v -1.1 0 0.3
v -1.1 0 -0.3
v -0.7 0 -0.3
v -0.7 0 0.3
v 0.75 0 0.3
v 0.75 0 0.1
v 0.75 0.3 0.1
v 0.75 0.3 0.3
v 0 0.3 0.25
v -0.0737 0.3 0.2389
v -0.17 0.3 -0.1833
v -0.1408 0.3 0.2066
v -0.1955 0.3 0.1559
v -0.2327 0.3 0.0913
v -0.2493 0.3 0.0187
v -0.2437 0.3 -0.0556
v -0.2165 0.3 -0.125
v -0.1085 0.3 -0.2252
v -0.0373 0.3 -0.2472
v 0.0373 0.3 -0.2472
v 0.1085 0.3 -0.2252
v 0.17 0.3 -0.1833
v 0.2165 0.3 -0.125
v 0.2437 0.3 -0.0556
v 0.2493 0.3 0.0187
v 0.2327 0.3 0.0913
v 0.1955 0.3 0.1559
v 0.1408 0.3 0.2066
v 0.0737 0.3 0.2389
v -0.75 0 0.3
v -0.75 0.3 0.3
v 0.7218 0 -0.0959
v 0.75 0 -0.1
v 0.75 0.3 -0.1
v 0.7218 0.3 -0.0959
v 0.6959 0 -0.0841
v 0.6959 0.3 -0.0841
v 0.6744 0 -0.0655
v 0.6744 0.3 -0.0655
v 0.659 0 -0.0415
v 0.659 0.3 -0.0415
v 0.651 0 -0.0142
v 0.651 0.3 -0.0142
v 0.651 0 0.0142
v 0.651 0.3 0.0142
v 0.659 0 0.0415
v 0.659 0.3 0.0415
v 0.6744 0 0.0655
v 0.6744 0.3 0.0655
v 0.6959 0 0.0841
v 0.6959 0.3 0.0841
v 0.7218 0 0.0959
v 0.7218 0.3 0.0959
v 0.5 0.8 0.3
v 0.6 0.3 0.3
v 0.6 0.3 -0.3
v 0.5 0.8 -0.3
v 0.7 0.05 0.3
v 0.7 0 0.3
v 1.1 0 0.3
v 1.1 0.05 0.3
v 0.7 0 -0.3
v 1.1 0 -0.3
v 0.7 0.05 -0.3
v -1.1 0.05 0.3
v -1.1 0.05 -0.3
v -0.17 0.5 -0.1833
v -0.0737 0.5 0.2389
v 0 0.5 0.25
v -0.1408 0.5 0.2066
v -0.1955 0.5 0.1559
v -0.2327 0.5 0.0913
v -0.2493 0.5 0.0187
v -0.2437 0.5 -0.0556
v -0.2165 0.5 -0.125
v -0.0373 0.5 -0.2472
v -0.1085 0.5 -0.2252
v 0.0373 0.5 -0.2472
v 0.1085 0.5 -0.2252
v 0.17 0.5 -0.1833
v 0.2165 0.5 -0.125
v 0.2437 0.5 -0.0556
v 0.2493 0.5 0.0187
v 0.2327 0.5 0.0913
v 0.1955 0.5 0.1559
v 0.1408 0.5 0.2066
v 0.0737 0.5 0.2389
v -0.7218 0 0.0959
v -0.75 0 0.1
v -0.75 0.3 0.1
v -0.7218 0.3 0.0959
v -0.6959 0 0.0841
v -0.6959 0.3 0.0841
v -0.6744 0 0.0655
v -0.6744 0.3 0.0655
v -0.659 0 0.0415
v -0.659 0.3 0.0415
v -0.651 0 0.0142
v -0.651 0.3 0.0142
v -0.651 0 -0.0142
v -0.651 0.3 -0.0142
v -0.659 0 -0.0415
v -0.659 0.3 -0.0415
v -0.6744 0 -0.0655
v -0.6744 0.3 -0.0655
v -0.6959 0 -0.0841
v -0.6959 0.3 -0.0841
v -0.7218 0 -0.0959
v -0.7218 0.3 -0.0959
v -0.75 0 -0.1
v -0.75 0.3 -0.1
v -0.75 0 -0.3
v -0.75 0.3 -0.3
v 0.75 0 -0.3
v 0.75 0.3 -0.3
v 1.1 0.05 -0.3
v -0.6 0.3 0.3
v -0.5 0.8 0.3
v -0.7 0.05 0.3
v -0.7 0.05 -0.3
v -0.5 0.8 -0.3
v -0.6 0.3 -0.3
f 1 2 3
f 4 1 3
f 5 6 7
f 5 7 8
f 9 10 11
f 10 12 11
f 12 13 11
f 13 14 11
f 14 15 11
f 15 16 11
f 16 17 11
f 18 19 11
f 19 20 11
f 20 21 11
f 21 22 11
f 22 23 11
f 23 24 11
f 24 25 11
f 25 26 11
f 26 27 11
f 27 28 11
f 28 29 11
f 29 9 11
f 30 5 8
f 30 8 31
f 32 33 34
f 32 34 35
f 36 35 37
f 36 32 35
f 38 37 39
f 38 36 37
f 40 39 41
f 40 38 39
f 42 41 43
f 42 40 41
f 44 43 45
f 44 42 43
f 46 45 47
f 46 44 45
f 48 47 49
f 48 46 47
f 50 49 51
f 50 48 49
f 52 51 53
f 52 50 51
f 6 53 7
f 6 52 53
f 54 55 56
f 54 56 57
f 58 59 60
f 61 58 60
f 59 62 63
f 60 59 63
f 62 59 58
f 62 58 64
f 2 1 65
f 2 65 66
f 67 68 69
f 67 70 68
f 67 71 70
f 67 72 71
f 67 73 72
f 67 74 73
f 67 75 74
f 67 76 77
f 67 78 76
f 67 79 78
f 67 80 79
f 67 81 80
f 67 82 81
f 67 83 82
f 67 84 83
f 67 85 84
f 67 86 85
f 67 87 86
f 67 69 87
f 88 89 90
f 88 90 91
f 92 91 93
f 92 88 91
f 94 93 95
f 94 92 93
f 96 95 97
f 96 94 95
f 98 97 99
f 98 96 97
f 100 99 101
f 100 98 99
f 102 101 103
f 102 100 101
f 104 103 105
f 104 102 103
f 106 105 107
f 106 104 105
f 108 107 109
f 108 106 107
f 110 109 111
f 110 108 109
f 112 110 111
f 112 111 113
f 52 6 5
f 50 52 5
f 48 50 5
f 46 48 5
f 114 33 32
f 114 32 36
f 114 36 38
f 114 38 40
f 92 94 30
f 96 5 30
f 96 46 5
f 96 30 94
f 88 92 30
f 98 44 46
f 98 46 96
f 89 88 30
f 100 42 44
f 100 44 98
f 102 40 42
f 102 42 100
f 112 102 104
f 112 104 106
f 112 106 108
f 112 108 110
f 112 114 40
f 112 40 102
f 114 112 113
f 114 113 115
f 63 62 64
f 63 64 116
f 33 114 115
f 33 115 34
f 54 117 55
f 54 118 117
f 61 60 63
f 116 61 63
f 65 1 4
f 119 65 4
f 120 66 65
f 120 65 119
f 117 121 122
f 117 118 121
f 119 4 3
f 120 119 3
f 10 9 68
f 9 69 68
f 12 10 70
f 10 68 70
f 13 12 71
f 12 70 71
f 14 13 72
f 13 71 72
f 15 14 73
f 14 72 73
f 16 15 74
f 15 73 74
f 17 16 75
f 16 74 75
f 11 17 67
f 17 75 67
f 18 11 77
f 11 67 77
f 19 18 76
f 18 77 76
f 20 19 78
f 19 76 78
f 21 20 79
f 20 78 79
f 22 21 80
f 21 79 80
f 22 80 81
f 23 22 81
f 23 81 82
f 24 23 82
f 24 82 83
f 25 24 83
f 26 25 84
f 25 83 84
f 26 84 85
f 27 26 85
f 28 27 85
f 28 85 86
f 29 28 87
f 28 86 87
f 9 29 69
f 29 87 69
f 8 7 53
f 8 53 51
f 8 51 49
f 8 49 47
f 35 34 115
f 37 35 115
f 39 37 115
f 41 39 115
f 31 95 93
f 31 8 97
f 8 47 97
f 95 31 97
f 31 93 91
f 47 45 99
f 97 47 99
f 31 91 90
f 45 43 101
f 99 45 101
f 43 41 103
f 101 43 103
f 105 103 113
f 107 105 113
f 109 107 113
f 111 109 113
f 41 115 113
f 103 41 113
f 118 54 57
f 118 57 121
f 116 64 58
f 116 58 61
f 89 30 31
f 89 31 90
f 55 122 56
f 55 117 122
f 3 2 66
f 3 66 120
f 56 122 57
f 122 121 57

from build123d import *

# Parameters (mm, degrees)
BOSS_EXTRUDE1_DEPTH   = 0.3
SKETCH3_W             = 0.25
SKETCH3_H             = 0.2
SKETCH4_W             = 0.4
SKETCH4_H             = 0.6
BOSS_EXTRUDE4_DEPTH   = 0.05
BOSS_EXTRUDE4_2_DEPTH = 0.05
BOSS_EXTRUDE5_DEPTH   = 0.3


with BuildPart() as part:
    # Sketch1 → Boss-Extrude1 (new body)
    with BuildSketch(Plane(origin=(0, 0, 0), x_dir=(1, 0, 0), z_dir=(0, 1, 0))):
        with BuildLine():
            Line((-0.75, 0.3), (0.75, 0.3))
            Line((0.75, 0.3), (0.75, 0.1))
            ThreePointArc((0.75, 0.1), (0.65, 0), (0.75, -0.1))
            Line((0.75, -0.1), (0.75, -0.3))
            Line((0.75, -0.3), (-0.75, -0.3))
            Line((-0.75, -0.3), (-0.75, -0.1))
            ThreePointArc((-0.75, -0.1), (-0.65, 0), (-0.75, 0.1))
            Line((-0.75, 0.1), (-0.75, 0.3))
        make_face()
    extrude(amount=BOSS_EXTRUDE1_DEPTH)


with BuildPart() as body_2:
    # Sketch3 → Revolve1 (revolve)
    with BuildSketch(Plane.XY, mode=Mode.PRIVATE) as revolve1_sk:
        with Locations((0.125, 0.4)):
            Rectangle(SKETCH3_W, SKETCH3_H)
    revolve(revolve1_sk.sketch.rotate(Axis((0, 0.809216282, 0), (0, -1, 0)), 90), axis=Axis((0, 0.809216282, 0), (0, -1, 0)))


with BuildPart() as body_3:
    # Sketch4 → Boss-Extrude4 (new body)
    with BuildSketch(Plane(origin=(0, 0, 0), x_dir=(1, 0, 0), z_dir=(0, 1, 0))):
        with Locations((0.9, 0)):
            Rectangle(SKETCH4_W, SKETCH4_H)
    extrude(amount=BOSS_EXTRUDE4_DEPTH)


with BuildPart() as body_4:
    # Sketch4 → Boss-Extrude4 2 (new body)
    with BuildSketch(Plane(origin=(0, 0, 0), x_dir=(1, 0, 0), z_dir=(0, 1, 0))):
        with Locations((-0.9, 0)):
            Rectangle(SKETCH4_W, SKETCH4_H)
    extrude(amount=BOSS_EXTRUDE4_2_DEPTH)


with BuildPart() as body_5:
    # Sketch2 → Boss-Extrude5 (new, symmetric)
    with BuildSketch(Plane.XY):
        Polygon((-0.6, 0.3), (0.6, 0.3), (0.5, 0.8), (-0.5, 0.8), align=None)
    extrude(amount=BOSS_EXTRUDE5_DEPTH, both=True)


solid = Compound([part.part, body_2.part, body_3.part, body_4.part, body_5.part])
